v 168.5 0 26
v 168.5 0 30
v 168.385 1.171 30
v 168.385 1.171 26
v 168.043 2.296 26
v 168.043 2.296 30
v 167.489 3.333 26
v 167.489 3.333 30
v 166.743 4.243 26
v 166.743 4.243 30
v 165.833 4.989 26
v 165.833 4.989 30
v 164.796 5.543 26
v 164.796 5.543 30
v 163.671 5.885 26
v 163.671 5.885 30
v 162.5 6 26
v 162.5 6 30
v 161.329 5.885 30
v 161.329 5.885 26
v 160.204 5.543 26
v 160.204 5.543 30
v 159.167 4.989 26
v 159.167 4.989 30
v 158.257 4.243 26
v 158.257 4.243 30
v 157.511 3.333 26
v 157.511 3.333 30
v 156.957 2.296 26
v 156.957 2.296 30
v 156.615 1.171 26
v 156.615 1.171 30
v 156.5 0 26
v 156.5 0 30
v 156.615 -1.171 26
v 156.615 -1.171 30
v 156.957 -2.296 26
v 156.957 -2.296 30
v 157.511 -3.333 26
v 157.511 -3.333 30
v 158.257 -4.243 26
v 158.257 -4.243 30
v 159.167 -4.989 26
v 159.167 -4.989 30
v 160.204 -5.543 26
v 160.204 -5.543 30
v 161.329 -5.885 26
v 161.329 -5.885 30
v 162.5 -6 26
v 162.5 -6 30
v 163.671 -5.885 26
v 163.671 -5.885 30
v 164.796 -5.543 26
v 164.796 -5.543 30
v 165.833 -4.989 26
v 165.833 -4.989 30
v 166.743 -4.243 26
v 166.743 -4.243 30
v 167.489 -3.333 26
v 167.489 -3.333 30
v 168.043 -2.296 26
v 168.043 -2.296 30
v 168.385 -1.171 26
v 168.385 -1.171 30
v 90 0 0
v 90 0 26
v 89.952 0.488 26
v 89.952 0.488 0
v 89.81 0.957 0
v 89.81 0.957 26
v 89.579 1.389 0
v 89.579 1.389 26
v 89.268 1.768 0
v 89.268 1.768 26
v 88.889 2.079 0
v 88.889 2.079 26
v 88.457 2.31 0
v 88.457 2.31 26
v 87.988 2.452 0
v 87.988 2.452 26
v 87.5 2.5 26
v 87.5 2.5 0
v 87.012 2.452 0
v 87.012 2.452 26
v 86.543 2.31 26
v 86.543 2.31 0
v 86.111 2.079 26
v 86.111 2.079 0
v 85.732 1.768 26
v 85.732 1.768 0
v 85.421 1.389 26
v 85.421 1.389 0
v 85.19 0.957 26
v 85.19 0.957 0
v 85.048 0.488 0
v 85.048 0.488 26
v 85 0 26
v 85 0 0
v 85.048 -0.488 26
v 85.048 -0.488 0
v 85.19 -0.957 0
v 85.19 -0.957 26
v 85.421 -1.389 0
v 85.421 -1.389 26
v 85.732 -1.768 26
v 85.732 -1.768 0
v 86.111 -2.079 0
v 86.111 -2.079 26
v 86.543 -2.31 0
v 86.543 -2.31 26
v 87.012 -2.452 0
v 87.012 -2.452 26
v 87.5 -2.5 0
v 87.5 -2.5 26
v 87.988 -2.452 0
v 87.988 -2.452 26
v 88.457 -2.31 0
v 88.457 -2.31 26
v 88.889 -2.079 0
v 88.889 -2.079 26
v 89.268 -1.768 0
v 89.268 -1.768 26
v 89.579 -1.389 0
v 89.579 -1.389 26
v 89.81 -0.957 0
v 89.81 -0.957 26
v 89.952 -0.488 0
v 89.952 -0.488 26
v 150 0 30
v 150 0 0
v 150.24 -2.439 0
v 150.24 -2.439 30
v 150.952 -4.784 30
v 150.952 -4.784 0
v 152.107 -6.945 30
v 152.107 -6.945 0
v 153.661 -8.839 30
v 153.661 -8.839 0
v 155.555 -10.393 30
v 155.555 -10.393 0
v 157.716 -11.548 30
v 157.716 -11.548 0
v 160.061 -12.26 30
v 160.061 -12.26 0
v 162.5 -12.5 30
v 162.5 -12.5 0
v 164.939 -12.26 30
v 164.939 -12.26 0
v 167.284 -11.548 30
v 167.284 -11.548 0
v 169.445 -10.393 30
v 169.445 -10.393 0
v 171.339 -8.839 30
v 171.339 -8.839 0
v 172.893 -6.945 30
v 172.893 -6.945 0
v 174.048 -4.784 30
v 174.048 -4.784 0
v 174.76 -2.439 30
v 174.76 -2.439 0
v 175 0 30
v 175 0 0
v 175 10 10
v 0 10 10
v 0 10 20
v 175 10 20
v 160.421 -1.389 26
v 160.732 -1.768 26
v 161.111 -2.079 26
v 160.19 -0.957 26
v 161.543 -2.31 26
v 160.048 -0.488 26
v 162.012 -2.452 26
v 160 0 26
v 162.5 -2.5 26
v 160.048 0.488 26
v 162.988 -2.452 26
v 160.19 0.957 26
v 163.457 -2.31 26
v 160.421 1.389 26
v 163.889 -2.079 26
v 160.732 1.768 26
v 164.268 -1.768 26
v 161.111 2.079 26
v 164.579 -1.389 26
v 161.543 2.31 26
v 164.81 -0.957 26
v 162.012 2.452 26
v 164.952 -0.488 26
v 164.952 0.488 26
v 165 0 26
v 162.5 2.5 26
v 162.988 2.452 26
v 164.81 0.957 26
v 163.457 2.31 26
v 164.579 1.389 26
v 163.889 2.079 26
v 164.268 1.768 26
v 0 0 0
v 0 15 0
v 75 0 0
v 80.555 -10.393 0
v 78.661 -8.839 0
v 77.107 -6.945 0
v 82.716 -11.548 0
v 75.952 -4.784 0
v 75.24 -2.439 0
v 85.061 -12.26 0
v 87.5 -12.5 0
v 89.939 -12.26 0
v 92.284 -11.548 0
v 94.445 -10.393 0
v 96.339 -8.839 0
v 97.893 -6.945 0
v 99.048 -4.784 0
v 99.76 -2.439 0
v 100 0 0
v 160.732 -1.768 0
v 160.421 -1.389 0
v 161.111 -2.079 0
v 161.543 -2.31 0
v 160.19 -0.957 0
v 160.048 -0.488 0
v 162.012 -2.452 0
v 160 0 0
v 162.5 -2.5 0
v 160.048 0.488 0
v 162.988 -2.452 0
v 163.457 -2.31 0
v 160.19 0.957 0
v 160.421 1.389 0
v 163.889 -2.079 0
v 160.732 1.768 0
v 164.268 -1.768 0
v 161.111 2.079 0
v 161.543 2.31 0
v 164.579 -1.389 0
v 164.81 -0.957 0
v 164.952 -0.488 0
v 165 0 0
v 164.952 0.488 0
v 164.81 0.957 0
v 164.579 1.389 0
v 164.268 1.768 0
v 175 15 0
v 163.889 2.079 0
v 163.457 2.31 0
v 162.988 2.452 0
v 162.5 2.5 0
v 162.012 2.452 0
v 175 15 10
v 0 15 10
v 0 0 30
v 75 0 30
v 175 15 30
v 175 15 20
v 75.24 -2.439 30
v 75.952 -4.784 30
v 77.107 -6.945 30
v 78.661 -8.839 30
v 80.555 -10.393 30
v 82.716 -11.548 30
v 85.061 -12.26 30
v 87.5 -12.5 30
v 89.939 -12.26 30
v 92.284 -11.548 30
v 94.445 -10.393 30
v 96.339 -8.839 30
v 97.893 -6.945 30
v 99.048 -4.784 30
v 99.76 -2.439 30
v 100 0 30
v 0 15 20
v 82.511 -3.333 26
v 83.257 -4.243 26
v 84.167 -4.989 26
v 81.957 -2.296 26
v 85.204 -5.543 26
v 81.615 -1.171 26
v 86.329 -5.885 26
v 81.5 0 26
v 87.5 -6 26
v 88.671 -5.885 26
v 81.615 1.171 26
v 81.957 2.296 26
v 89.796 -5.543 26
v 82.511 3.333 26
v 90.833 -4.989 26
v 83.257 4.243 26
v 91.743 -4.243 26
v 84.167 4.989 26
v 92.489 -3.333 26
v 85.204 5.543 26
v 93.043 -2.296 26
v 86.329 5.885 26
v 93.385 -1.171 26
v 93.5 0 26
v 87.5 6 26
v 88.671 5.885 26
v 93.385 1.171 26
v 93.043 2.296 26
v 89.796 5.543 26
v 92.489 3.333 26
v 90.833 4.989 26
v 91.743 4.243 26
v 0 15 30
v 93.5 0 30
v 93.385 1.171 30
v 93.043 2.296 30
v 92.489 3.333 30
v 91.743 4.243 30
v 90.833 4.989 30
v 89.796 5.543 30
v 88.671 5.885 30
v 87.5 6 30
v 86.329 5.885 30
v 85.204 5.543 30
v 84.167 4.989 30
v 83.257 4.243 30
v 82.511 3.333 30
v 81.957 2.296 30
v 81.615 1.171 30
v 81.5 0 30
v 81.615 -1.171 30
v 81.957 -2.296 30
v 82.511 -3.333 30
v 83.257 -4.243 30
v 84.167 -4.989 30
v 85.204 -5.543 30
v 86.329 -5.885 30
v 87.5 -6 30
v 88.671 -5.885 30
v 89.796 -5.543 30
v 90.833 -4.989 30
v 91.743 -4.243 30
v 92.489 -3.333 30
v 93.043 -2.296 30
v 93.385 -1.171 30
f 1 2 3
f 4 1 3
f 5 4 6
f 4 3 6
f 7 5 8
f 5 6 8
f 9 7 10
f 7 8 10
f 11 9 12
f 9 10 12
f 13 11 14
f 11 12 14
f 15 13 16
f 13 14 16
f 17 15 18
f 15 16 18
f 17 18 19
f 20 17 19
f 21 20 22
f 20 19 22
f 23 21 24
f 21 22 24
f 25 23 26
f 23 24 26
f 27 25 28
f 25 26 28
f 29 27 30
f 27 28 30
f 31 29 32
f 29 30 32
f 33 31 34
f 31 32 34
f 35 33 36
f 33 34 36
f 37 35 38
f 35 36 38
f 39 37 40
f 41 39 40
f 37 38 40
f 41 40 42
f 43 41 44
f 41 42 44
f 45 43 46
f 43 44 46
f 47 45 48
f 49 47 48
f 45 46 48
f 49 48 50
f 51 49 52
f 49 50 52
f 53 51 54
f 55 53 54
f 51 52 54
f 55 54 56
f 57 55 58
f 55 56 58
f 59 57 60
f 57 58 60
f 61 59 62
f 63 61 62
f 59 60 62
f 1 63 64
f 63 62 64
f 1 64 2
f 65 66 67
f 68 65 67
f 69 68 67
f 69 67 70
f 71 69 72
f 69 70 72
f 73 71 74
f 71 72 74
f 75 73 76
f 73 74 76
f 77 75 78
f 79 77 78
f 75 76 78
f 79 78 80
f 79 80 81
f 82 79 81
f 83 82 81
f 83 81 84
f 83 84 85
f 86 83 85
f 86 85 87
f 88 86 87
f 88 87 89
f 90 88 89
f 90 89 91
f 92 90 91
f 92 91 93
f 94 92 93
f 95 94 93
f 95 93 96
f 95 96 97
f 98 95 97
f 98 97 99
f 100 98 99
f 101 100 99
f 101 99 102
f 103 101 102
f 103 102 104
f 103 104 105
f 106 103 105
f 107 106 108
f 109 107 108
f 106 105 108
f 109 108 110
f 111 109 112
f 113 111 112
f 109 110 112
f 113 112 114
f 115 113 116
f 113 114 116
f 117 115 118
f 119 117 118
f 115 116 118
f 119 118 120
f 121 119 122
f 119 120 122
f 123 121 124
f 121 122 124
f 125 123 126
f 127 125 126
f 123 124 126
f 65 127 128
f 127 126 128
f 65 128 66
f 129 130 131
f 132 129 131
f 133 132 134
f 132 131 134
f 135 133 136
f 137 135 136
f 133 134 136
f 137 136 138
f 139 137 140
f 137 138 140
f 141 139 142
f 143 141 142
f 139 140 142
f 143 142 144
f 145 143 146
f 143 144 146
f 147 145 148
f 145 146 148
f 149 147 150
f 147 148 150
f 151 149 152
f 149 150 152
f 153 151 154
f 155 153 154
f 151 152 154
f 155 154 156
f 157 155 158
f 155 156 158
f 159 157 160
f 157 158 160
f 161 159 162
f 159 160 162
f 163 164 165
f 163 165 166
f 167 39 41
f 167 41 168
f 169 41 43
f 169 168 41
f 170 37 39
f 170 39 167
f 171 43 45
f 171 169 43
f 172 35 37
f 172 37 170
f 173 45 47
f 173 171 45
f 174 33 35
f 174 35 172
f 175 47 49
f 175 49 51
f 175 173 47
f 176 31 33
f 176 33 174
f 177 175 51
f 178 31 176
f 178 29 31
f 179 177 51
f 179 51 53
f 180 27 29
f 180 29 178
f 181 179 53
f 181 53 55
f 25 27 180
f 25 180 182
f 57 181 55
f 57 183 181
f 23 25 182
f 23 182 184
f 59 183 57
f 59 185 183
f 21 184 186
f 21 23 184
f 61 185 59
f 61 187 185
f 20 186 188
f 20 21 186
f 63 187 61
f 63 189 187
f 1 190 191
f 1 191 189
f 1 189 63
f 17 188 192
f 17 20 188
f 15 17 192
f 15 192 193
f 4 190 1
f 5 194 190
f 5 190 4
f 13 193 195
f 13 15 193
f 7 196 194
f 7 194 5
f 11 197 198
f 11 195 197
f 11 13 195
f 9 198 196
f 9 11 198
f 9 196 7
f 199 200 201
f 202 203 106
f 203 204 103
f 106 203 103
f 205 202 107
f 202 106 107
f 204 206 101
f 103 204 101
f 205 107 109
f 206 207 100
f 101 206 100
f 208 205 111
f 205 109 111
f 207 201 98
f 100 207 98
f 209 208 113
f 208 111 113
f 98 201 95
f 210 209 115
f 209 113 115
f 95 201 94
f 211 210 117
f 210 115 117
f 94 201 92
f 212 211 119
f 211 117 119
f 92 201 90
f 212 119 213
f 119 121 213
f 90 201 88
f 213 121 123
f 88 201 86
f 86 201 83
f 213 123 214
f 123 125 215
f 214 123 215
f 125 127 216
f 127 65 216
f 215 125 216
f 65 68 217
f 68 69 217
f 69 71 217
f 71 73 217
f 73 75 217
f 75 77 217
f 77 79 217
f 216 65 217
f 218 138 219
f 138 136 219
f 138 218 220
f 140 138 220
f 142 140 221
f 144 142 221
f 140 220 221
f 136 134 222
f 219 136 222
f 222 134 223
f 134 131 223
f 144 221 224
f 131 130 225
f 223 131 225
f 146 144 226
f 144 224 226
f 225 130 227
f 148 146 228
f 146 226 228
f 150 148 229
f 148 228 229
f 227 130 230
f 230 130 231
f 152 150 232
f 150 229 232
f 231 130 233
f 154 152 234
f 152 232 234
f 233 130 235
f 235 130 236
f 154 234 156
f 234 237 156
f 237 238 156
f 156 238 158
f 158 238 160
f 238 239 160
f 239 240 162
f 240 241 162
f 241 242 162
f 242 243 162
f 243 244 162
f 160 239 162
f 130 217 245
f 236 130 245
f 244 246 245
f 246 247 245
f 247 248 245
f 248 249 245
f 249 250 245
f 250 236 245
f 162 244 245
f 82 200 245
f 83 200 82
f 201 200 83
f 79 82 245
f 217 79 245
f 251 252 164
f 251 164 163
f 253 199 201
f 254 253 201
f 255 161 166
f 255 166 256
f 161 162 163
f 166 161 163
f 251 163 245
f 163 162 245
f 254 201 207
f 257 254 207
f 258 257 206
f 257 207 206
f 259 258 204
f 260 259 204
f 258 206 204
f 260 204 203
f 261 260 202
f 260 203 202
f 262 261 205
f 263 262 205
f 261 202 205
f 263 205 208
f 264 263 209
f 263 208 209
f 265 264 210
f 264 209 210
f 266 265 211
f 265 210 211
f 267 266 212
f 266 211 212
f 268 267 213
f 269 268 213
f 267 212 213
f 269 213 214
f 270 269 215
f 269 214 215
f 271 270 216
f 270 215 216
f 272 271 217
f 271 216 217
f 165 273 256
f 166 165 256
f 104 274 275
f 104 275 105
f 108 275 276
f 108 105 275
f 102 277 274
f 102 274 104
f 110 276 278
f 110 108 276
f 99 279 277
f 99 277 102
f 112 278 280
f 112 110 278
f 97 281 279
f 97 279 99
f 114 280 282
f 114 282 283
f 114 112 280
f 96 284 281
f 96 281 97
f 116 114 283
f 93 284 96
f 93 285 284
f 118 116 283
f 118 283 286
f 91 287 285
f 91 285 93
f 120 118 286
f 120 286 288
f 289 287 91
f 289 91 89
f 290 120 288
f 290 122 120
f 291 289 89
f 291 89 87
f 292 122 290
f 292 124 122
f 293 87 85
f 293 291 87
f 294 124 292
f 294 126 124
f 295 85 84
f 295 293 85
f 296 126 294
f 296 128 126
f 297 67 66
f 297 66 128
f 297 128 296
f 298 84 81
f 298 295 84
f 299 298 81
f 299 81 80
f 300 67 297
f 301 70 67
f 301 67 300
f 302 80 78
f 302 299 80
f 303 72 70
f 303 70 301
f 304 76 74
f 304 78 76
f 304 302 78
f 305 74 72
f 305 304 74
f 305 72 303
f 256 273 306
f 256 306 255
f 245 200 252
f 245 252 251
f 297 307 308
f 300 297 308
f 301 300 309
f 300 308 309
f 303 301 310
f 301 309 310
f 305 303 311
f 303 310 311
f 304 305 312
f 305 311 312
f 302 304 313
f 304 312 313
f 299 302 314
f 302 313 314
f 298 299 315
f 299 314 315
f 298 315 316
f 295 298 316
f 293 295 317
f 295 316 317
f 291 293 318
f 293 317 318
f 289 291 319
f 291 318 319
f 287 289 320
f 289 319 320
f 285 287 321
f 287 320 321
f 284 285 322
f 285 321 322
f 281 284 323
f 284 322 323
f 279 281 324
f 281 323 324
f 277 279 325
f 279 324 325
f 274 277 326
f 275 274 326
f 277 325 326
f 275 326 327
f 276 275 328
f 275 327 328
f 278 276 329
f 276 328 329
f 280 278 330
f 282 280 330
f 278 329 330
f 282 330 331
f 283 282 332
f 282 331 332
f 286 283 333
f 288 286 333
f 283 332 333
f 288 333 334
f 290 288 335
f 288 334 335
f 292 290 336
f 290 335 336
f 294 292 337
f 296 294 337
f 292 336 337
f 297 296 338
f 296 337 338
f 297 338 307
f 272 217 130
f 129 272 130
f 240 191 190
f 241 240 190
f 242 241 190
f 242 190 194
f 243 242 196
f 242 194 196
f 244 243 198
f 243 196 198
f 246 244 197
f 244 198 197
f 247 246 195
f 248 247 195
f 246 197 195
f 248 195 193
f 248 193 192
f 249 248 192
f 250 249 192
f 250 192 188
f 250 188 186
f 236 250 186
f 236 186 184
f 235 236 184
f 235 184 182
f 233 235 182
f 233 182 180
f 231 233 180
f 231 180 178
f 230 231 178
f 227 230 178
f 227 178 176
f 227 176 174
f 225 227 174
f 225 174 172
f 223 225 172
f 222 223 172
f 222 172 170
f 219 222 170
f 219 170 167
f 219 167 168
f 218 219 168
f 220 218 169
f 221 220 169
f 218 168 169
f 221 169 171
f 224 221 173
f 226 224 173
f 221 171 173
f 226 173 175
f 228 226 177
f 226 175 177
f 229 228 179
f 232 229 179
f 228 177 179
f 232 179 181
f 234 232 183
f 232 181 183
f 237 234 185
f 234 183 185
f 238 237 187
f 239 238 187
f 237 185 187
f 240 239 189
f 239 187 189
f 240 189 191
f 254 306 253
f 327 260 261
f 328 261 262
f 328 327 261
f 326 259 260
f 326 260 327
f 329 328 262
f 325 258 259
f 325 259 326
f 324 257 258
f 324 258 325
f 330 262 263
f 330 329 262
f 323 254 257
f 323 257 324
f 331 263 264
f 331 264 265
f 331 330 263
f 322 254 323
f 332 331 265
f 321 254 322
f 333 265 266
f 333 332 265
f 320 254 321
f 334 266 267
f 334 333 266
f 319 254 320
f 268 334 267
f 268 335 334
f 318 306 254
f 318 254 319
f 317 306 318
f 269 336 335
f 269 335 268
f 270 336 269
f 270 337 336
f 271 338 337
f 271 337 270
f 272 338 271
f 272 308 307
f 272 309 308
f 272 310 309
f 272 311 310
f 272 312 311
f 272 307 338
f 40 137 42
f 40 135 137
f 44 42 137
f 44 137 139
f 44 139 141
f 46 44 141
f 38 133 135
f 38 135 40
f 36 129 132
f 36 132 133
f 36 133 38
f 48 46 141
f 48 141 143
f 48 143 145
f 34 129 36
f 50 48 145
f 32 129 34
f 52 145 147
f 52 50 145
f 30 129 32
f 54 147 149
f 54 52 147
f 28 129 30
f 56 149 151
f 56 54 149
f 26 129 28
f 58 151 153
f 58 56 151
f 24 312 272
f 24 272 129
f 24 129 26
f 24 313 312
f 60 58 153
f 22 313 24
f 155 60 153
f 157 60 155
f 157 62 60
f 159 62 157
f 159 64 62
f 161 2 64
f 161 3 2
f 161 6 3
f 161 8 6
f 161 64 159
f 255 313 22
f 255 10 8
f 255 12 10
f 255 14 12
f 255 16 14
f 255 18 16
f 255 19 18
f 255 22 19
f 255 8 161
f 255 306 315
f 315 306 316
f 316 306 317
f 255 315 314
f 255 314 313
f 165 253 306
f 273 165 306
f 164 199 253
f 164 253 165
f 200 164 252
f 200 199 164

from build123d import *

# Parameters (mm, degrees)
BOSS_EXTRUDE1_DEPTH = 30
CUT_EXTRUDE2_REACH  = 180.185
SKETCH2_R           = 2.5
SKETCH2_3_R         = 6
SKETCH2_3_R_2       = 2.5
CUT_EXTRUDE3_DEPTH  = 4
SKETCH3_W           = 175
SKETCH3_H           = 10
CUT_EXTRUDE4_DEPTH  = 5


with BuildPart() as part:
    # Sketch1 → Boss-Extrude1 (new body)
    with BuildSketch(Plane.XY):
        with BuildLine():
            Line((0, 0), (75, 0))
            ThreePointArc((75, 0), (87.5, -12.5), (100, 0))
            Line((100, 0), (150, 0))
            ThreePointArc((150, 0), (162.5, -12.5), (175, 0))
            Line((175, 0), (175, 15))
            Line((175, 15), (0, 15))
            Line((0, 15), (0, 0))
        make_face()
    extrude(amount=BOSS_EXTRUDE1_DEPTH)

    # Sketch2 → Cut-Extrude2 (cut, up to next)
    with BuildSketch(Plane.XY.offset(30), mode=Mode.PRIVATE) as cut_extrude2_sk1:
        with Locations((87.5, 0)):
            Circle(SKETCH2_R)
    cut_extrude2_tool1 = extrude(cut_extrude2_sk1.sketch, amount=-CUT_EXTRUDE2_REACH, mode=Mode.PRIVATE) & part.part
    # Sketch2 → Cut-Extrude2 (cut, up to next)
    with BuildSketch(Plane.XY.offset(30), mode=Mode.PRIVATE) as cut_extrude2_sk2:
        with Locations((162.5, 0)):
            Circle(SKETCH2_R)
    cut_extrude2_tool2 = extrude(cut_extrude2_sk2.sketch, amount=-CUT_EXTRUDE2_REACH, mode=Mode.PRIVATE) & part.part
    add(cut_extrude2_tool1.solids().sort_by_distance((87.5, 0, 30))[0], mode=Mode.SUBTRACT)
    add(cut_extrude2_tool2.solids().sort_by_distance((162.5, 0, 30))[0], mode=Mode.SUBTRACT)

    # Sketch2<3> → Cut-Extrude3 (cut)
    # profile 1 of 2: a face of its own
    with BuildSketch(Plane.XY.offset(30)):
        with Locations((87.5, 0)):
            Circle(SKETCH2_3_R)
        with Locations((87.5, 0)):
            Circle(SKETCH2_3_R_2, mode=Mode.SUBTRACT)
    # profile 2 of 2: a face of its own
    with BuildSketch(Plane.XY.offset(30)):
        with Locations((162.5, 0)):
            Circle(SKETCH2_3_R)
        with Locations((162.5, 0)):
            Circle(SKETCH2_3_R_2, mode=Mode.SUBTRACT)
    extrude(amount=-CUT_EXTRUDE3_DEPTH, mode=Mode.SUBTRACT)

    # Sketch3 → Cut-Extrude4 (cut)
    with BuildSketch(Plane(origin=(0, 15, 0), x_dir=(1, 0, 0), z_dir=(0, 1, 0))):
        with Locations((87.5, -15)):
            Rectangle(SKETCH3_W, SKETCH3_H)
    extrude(amount=-CUT_EXTRUDE4_DEPTH, mode=Mode.SUBTRACT)


solid = part.part
